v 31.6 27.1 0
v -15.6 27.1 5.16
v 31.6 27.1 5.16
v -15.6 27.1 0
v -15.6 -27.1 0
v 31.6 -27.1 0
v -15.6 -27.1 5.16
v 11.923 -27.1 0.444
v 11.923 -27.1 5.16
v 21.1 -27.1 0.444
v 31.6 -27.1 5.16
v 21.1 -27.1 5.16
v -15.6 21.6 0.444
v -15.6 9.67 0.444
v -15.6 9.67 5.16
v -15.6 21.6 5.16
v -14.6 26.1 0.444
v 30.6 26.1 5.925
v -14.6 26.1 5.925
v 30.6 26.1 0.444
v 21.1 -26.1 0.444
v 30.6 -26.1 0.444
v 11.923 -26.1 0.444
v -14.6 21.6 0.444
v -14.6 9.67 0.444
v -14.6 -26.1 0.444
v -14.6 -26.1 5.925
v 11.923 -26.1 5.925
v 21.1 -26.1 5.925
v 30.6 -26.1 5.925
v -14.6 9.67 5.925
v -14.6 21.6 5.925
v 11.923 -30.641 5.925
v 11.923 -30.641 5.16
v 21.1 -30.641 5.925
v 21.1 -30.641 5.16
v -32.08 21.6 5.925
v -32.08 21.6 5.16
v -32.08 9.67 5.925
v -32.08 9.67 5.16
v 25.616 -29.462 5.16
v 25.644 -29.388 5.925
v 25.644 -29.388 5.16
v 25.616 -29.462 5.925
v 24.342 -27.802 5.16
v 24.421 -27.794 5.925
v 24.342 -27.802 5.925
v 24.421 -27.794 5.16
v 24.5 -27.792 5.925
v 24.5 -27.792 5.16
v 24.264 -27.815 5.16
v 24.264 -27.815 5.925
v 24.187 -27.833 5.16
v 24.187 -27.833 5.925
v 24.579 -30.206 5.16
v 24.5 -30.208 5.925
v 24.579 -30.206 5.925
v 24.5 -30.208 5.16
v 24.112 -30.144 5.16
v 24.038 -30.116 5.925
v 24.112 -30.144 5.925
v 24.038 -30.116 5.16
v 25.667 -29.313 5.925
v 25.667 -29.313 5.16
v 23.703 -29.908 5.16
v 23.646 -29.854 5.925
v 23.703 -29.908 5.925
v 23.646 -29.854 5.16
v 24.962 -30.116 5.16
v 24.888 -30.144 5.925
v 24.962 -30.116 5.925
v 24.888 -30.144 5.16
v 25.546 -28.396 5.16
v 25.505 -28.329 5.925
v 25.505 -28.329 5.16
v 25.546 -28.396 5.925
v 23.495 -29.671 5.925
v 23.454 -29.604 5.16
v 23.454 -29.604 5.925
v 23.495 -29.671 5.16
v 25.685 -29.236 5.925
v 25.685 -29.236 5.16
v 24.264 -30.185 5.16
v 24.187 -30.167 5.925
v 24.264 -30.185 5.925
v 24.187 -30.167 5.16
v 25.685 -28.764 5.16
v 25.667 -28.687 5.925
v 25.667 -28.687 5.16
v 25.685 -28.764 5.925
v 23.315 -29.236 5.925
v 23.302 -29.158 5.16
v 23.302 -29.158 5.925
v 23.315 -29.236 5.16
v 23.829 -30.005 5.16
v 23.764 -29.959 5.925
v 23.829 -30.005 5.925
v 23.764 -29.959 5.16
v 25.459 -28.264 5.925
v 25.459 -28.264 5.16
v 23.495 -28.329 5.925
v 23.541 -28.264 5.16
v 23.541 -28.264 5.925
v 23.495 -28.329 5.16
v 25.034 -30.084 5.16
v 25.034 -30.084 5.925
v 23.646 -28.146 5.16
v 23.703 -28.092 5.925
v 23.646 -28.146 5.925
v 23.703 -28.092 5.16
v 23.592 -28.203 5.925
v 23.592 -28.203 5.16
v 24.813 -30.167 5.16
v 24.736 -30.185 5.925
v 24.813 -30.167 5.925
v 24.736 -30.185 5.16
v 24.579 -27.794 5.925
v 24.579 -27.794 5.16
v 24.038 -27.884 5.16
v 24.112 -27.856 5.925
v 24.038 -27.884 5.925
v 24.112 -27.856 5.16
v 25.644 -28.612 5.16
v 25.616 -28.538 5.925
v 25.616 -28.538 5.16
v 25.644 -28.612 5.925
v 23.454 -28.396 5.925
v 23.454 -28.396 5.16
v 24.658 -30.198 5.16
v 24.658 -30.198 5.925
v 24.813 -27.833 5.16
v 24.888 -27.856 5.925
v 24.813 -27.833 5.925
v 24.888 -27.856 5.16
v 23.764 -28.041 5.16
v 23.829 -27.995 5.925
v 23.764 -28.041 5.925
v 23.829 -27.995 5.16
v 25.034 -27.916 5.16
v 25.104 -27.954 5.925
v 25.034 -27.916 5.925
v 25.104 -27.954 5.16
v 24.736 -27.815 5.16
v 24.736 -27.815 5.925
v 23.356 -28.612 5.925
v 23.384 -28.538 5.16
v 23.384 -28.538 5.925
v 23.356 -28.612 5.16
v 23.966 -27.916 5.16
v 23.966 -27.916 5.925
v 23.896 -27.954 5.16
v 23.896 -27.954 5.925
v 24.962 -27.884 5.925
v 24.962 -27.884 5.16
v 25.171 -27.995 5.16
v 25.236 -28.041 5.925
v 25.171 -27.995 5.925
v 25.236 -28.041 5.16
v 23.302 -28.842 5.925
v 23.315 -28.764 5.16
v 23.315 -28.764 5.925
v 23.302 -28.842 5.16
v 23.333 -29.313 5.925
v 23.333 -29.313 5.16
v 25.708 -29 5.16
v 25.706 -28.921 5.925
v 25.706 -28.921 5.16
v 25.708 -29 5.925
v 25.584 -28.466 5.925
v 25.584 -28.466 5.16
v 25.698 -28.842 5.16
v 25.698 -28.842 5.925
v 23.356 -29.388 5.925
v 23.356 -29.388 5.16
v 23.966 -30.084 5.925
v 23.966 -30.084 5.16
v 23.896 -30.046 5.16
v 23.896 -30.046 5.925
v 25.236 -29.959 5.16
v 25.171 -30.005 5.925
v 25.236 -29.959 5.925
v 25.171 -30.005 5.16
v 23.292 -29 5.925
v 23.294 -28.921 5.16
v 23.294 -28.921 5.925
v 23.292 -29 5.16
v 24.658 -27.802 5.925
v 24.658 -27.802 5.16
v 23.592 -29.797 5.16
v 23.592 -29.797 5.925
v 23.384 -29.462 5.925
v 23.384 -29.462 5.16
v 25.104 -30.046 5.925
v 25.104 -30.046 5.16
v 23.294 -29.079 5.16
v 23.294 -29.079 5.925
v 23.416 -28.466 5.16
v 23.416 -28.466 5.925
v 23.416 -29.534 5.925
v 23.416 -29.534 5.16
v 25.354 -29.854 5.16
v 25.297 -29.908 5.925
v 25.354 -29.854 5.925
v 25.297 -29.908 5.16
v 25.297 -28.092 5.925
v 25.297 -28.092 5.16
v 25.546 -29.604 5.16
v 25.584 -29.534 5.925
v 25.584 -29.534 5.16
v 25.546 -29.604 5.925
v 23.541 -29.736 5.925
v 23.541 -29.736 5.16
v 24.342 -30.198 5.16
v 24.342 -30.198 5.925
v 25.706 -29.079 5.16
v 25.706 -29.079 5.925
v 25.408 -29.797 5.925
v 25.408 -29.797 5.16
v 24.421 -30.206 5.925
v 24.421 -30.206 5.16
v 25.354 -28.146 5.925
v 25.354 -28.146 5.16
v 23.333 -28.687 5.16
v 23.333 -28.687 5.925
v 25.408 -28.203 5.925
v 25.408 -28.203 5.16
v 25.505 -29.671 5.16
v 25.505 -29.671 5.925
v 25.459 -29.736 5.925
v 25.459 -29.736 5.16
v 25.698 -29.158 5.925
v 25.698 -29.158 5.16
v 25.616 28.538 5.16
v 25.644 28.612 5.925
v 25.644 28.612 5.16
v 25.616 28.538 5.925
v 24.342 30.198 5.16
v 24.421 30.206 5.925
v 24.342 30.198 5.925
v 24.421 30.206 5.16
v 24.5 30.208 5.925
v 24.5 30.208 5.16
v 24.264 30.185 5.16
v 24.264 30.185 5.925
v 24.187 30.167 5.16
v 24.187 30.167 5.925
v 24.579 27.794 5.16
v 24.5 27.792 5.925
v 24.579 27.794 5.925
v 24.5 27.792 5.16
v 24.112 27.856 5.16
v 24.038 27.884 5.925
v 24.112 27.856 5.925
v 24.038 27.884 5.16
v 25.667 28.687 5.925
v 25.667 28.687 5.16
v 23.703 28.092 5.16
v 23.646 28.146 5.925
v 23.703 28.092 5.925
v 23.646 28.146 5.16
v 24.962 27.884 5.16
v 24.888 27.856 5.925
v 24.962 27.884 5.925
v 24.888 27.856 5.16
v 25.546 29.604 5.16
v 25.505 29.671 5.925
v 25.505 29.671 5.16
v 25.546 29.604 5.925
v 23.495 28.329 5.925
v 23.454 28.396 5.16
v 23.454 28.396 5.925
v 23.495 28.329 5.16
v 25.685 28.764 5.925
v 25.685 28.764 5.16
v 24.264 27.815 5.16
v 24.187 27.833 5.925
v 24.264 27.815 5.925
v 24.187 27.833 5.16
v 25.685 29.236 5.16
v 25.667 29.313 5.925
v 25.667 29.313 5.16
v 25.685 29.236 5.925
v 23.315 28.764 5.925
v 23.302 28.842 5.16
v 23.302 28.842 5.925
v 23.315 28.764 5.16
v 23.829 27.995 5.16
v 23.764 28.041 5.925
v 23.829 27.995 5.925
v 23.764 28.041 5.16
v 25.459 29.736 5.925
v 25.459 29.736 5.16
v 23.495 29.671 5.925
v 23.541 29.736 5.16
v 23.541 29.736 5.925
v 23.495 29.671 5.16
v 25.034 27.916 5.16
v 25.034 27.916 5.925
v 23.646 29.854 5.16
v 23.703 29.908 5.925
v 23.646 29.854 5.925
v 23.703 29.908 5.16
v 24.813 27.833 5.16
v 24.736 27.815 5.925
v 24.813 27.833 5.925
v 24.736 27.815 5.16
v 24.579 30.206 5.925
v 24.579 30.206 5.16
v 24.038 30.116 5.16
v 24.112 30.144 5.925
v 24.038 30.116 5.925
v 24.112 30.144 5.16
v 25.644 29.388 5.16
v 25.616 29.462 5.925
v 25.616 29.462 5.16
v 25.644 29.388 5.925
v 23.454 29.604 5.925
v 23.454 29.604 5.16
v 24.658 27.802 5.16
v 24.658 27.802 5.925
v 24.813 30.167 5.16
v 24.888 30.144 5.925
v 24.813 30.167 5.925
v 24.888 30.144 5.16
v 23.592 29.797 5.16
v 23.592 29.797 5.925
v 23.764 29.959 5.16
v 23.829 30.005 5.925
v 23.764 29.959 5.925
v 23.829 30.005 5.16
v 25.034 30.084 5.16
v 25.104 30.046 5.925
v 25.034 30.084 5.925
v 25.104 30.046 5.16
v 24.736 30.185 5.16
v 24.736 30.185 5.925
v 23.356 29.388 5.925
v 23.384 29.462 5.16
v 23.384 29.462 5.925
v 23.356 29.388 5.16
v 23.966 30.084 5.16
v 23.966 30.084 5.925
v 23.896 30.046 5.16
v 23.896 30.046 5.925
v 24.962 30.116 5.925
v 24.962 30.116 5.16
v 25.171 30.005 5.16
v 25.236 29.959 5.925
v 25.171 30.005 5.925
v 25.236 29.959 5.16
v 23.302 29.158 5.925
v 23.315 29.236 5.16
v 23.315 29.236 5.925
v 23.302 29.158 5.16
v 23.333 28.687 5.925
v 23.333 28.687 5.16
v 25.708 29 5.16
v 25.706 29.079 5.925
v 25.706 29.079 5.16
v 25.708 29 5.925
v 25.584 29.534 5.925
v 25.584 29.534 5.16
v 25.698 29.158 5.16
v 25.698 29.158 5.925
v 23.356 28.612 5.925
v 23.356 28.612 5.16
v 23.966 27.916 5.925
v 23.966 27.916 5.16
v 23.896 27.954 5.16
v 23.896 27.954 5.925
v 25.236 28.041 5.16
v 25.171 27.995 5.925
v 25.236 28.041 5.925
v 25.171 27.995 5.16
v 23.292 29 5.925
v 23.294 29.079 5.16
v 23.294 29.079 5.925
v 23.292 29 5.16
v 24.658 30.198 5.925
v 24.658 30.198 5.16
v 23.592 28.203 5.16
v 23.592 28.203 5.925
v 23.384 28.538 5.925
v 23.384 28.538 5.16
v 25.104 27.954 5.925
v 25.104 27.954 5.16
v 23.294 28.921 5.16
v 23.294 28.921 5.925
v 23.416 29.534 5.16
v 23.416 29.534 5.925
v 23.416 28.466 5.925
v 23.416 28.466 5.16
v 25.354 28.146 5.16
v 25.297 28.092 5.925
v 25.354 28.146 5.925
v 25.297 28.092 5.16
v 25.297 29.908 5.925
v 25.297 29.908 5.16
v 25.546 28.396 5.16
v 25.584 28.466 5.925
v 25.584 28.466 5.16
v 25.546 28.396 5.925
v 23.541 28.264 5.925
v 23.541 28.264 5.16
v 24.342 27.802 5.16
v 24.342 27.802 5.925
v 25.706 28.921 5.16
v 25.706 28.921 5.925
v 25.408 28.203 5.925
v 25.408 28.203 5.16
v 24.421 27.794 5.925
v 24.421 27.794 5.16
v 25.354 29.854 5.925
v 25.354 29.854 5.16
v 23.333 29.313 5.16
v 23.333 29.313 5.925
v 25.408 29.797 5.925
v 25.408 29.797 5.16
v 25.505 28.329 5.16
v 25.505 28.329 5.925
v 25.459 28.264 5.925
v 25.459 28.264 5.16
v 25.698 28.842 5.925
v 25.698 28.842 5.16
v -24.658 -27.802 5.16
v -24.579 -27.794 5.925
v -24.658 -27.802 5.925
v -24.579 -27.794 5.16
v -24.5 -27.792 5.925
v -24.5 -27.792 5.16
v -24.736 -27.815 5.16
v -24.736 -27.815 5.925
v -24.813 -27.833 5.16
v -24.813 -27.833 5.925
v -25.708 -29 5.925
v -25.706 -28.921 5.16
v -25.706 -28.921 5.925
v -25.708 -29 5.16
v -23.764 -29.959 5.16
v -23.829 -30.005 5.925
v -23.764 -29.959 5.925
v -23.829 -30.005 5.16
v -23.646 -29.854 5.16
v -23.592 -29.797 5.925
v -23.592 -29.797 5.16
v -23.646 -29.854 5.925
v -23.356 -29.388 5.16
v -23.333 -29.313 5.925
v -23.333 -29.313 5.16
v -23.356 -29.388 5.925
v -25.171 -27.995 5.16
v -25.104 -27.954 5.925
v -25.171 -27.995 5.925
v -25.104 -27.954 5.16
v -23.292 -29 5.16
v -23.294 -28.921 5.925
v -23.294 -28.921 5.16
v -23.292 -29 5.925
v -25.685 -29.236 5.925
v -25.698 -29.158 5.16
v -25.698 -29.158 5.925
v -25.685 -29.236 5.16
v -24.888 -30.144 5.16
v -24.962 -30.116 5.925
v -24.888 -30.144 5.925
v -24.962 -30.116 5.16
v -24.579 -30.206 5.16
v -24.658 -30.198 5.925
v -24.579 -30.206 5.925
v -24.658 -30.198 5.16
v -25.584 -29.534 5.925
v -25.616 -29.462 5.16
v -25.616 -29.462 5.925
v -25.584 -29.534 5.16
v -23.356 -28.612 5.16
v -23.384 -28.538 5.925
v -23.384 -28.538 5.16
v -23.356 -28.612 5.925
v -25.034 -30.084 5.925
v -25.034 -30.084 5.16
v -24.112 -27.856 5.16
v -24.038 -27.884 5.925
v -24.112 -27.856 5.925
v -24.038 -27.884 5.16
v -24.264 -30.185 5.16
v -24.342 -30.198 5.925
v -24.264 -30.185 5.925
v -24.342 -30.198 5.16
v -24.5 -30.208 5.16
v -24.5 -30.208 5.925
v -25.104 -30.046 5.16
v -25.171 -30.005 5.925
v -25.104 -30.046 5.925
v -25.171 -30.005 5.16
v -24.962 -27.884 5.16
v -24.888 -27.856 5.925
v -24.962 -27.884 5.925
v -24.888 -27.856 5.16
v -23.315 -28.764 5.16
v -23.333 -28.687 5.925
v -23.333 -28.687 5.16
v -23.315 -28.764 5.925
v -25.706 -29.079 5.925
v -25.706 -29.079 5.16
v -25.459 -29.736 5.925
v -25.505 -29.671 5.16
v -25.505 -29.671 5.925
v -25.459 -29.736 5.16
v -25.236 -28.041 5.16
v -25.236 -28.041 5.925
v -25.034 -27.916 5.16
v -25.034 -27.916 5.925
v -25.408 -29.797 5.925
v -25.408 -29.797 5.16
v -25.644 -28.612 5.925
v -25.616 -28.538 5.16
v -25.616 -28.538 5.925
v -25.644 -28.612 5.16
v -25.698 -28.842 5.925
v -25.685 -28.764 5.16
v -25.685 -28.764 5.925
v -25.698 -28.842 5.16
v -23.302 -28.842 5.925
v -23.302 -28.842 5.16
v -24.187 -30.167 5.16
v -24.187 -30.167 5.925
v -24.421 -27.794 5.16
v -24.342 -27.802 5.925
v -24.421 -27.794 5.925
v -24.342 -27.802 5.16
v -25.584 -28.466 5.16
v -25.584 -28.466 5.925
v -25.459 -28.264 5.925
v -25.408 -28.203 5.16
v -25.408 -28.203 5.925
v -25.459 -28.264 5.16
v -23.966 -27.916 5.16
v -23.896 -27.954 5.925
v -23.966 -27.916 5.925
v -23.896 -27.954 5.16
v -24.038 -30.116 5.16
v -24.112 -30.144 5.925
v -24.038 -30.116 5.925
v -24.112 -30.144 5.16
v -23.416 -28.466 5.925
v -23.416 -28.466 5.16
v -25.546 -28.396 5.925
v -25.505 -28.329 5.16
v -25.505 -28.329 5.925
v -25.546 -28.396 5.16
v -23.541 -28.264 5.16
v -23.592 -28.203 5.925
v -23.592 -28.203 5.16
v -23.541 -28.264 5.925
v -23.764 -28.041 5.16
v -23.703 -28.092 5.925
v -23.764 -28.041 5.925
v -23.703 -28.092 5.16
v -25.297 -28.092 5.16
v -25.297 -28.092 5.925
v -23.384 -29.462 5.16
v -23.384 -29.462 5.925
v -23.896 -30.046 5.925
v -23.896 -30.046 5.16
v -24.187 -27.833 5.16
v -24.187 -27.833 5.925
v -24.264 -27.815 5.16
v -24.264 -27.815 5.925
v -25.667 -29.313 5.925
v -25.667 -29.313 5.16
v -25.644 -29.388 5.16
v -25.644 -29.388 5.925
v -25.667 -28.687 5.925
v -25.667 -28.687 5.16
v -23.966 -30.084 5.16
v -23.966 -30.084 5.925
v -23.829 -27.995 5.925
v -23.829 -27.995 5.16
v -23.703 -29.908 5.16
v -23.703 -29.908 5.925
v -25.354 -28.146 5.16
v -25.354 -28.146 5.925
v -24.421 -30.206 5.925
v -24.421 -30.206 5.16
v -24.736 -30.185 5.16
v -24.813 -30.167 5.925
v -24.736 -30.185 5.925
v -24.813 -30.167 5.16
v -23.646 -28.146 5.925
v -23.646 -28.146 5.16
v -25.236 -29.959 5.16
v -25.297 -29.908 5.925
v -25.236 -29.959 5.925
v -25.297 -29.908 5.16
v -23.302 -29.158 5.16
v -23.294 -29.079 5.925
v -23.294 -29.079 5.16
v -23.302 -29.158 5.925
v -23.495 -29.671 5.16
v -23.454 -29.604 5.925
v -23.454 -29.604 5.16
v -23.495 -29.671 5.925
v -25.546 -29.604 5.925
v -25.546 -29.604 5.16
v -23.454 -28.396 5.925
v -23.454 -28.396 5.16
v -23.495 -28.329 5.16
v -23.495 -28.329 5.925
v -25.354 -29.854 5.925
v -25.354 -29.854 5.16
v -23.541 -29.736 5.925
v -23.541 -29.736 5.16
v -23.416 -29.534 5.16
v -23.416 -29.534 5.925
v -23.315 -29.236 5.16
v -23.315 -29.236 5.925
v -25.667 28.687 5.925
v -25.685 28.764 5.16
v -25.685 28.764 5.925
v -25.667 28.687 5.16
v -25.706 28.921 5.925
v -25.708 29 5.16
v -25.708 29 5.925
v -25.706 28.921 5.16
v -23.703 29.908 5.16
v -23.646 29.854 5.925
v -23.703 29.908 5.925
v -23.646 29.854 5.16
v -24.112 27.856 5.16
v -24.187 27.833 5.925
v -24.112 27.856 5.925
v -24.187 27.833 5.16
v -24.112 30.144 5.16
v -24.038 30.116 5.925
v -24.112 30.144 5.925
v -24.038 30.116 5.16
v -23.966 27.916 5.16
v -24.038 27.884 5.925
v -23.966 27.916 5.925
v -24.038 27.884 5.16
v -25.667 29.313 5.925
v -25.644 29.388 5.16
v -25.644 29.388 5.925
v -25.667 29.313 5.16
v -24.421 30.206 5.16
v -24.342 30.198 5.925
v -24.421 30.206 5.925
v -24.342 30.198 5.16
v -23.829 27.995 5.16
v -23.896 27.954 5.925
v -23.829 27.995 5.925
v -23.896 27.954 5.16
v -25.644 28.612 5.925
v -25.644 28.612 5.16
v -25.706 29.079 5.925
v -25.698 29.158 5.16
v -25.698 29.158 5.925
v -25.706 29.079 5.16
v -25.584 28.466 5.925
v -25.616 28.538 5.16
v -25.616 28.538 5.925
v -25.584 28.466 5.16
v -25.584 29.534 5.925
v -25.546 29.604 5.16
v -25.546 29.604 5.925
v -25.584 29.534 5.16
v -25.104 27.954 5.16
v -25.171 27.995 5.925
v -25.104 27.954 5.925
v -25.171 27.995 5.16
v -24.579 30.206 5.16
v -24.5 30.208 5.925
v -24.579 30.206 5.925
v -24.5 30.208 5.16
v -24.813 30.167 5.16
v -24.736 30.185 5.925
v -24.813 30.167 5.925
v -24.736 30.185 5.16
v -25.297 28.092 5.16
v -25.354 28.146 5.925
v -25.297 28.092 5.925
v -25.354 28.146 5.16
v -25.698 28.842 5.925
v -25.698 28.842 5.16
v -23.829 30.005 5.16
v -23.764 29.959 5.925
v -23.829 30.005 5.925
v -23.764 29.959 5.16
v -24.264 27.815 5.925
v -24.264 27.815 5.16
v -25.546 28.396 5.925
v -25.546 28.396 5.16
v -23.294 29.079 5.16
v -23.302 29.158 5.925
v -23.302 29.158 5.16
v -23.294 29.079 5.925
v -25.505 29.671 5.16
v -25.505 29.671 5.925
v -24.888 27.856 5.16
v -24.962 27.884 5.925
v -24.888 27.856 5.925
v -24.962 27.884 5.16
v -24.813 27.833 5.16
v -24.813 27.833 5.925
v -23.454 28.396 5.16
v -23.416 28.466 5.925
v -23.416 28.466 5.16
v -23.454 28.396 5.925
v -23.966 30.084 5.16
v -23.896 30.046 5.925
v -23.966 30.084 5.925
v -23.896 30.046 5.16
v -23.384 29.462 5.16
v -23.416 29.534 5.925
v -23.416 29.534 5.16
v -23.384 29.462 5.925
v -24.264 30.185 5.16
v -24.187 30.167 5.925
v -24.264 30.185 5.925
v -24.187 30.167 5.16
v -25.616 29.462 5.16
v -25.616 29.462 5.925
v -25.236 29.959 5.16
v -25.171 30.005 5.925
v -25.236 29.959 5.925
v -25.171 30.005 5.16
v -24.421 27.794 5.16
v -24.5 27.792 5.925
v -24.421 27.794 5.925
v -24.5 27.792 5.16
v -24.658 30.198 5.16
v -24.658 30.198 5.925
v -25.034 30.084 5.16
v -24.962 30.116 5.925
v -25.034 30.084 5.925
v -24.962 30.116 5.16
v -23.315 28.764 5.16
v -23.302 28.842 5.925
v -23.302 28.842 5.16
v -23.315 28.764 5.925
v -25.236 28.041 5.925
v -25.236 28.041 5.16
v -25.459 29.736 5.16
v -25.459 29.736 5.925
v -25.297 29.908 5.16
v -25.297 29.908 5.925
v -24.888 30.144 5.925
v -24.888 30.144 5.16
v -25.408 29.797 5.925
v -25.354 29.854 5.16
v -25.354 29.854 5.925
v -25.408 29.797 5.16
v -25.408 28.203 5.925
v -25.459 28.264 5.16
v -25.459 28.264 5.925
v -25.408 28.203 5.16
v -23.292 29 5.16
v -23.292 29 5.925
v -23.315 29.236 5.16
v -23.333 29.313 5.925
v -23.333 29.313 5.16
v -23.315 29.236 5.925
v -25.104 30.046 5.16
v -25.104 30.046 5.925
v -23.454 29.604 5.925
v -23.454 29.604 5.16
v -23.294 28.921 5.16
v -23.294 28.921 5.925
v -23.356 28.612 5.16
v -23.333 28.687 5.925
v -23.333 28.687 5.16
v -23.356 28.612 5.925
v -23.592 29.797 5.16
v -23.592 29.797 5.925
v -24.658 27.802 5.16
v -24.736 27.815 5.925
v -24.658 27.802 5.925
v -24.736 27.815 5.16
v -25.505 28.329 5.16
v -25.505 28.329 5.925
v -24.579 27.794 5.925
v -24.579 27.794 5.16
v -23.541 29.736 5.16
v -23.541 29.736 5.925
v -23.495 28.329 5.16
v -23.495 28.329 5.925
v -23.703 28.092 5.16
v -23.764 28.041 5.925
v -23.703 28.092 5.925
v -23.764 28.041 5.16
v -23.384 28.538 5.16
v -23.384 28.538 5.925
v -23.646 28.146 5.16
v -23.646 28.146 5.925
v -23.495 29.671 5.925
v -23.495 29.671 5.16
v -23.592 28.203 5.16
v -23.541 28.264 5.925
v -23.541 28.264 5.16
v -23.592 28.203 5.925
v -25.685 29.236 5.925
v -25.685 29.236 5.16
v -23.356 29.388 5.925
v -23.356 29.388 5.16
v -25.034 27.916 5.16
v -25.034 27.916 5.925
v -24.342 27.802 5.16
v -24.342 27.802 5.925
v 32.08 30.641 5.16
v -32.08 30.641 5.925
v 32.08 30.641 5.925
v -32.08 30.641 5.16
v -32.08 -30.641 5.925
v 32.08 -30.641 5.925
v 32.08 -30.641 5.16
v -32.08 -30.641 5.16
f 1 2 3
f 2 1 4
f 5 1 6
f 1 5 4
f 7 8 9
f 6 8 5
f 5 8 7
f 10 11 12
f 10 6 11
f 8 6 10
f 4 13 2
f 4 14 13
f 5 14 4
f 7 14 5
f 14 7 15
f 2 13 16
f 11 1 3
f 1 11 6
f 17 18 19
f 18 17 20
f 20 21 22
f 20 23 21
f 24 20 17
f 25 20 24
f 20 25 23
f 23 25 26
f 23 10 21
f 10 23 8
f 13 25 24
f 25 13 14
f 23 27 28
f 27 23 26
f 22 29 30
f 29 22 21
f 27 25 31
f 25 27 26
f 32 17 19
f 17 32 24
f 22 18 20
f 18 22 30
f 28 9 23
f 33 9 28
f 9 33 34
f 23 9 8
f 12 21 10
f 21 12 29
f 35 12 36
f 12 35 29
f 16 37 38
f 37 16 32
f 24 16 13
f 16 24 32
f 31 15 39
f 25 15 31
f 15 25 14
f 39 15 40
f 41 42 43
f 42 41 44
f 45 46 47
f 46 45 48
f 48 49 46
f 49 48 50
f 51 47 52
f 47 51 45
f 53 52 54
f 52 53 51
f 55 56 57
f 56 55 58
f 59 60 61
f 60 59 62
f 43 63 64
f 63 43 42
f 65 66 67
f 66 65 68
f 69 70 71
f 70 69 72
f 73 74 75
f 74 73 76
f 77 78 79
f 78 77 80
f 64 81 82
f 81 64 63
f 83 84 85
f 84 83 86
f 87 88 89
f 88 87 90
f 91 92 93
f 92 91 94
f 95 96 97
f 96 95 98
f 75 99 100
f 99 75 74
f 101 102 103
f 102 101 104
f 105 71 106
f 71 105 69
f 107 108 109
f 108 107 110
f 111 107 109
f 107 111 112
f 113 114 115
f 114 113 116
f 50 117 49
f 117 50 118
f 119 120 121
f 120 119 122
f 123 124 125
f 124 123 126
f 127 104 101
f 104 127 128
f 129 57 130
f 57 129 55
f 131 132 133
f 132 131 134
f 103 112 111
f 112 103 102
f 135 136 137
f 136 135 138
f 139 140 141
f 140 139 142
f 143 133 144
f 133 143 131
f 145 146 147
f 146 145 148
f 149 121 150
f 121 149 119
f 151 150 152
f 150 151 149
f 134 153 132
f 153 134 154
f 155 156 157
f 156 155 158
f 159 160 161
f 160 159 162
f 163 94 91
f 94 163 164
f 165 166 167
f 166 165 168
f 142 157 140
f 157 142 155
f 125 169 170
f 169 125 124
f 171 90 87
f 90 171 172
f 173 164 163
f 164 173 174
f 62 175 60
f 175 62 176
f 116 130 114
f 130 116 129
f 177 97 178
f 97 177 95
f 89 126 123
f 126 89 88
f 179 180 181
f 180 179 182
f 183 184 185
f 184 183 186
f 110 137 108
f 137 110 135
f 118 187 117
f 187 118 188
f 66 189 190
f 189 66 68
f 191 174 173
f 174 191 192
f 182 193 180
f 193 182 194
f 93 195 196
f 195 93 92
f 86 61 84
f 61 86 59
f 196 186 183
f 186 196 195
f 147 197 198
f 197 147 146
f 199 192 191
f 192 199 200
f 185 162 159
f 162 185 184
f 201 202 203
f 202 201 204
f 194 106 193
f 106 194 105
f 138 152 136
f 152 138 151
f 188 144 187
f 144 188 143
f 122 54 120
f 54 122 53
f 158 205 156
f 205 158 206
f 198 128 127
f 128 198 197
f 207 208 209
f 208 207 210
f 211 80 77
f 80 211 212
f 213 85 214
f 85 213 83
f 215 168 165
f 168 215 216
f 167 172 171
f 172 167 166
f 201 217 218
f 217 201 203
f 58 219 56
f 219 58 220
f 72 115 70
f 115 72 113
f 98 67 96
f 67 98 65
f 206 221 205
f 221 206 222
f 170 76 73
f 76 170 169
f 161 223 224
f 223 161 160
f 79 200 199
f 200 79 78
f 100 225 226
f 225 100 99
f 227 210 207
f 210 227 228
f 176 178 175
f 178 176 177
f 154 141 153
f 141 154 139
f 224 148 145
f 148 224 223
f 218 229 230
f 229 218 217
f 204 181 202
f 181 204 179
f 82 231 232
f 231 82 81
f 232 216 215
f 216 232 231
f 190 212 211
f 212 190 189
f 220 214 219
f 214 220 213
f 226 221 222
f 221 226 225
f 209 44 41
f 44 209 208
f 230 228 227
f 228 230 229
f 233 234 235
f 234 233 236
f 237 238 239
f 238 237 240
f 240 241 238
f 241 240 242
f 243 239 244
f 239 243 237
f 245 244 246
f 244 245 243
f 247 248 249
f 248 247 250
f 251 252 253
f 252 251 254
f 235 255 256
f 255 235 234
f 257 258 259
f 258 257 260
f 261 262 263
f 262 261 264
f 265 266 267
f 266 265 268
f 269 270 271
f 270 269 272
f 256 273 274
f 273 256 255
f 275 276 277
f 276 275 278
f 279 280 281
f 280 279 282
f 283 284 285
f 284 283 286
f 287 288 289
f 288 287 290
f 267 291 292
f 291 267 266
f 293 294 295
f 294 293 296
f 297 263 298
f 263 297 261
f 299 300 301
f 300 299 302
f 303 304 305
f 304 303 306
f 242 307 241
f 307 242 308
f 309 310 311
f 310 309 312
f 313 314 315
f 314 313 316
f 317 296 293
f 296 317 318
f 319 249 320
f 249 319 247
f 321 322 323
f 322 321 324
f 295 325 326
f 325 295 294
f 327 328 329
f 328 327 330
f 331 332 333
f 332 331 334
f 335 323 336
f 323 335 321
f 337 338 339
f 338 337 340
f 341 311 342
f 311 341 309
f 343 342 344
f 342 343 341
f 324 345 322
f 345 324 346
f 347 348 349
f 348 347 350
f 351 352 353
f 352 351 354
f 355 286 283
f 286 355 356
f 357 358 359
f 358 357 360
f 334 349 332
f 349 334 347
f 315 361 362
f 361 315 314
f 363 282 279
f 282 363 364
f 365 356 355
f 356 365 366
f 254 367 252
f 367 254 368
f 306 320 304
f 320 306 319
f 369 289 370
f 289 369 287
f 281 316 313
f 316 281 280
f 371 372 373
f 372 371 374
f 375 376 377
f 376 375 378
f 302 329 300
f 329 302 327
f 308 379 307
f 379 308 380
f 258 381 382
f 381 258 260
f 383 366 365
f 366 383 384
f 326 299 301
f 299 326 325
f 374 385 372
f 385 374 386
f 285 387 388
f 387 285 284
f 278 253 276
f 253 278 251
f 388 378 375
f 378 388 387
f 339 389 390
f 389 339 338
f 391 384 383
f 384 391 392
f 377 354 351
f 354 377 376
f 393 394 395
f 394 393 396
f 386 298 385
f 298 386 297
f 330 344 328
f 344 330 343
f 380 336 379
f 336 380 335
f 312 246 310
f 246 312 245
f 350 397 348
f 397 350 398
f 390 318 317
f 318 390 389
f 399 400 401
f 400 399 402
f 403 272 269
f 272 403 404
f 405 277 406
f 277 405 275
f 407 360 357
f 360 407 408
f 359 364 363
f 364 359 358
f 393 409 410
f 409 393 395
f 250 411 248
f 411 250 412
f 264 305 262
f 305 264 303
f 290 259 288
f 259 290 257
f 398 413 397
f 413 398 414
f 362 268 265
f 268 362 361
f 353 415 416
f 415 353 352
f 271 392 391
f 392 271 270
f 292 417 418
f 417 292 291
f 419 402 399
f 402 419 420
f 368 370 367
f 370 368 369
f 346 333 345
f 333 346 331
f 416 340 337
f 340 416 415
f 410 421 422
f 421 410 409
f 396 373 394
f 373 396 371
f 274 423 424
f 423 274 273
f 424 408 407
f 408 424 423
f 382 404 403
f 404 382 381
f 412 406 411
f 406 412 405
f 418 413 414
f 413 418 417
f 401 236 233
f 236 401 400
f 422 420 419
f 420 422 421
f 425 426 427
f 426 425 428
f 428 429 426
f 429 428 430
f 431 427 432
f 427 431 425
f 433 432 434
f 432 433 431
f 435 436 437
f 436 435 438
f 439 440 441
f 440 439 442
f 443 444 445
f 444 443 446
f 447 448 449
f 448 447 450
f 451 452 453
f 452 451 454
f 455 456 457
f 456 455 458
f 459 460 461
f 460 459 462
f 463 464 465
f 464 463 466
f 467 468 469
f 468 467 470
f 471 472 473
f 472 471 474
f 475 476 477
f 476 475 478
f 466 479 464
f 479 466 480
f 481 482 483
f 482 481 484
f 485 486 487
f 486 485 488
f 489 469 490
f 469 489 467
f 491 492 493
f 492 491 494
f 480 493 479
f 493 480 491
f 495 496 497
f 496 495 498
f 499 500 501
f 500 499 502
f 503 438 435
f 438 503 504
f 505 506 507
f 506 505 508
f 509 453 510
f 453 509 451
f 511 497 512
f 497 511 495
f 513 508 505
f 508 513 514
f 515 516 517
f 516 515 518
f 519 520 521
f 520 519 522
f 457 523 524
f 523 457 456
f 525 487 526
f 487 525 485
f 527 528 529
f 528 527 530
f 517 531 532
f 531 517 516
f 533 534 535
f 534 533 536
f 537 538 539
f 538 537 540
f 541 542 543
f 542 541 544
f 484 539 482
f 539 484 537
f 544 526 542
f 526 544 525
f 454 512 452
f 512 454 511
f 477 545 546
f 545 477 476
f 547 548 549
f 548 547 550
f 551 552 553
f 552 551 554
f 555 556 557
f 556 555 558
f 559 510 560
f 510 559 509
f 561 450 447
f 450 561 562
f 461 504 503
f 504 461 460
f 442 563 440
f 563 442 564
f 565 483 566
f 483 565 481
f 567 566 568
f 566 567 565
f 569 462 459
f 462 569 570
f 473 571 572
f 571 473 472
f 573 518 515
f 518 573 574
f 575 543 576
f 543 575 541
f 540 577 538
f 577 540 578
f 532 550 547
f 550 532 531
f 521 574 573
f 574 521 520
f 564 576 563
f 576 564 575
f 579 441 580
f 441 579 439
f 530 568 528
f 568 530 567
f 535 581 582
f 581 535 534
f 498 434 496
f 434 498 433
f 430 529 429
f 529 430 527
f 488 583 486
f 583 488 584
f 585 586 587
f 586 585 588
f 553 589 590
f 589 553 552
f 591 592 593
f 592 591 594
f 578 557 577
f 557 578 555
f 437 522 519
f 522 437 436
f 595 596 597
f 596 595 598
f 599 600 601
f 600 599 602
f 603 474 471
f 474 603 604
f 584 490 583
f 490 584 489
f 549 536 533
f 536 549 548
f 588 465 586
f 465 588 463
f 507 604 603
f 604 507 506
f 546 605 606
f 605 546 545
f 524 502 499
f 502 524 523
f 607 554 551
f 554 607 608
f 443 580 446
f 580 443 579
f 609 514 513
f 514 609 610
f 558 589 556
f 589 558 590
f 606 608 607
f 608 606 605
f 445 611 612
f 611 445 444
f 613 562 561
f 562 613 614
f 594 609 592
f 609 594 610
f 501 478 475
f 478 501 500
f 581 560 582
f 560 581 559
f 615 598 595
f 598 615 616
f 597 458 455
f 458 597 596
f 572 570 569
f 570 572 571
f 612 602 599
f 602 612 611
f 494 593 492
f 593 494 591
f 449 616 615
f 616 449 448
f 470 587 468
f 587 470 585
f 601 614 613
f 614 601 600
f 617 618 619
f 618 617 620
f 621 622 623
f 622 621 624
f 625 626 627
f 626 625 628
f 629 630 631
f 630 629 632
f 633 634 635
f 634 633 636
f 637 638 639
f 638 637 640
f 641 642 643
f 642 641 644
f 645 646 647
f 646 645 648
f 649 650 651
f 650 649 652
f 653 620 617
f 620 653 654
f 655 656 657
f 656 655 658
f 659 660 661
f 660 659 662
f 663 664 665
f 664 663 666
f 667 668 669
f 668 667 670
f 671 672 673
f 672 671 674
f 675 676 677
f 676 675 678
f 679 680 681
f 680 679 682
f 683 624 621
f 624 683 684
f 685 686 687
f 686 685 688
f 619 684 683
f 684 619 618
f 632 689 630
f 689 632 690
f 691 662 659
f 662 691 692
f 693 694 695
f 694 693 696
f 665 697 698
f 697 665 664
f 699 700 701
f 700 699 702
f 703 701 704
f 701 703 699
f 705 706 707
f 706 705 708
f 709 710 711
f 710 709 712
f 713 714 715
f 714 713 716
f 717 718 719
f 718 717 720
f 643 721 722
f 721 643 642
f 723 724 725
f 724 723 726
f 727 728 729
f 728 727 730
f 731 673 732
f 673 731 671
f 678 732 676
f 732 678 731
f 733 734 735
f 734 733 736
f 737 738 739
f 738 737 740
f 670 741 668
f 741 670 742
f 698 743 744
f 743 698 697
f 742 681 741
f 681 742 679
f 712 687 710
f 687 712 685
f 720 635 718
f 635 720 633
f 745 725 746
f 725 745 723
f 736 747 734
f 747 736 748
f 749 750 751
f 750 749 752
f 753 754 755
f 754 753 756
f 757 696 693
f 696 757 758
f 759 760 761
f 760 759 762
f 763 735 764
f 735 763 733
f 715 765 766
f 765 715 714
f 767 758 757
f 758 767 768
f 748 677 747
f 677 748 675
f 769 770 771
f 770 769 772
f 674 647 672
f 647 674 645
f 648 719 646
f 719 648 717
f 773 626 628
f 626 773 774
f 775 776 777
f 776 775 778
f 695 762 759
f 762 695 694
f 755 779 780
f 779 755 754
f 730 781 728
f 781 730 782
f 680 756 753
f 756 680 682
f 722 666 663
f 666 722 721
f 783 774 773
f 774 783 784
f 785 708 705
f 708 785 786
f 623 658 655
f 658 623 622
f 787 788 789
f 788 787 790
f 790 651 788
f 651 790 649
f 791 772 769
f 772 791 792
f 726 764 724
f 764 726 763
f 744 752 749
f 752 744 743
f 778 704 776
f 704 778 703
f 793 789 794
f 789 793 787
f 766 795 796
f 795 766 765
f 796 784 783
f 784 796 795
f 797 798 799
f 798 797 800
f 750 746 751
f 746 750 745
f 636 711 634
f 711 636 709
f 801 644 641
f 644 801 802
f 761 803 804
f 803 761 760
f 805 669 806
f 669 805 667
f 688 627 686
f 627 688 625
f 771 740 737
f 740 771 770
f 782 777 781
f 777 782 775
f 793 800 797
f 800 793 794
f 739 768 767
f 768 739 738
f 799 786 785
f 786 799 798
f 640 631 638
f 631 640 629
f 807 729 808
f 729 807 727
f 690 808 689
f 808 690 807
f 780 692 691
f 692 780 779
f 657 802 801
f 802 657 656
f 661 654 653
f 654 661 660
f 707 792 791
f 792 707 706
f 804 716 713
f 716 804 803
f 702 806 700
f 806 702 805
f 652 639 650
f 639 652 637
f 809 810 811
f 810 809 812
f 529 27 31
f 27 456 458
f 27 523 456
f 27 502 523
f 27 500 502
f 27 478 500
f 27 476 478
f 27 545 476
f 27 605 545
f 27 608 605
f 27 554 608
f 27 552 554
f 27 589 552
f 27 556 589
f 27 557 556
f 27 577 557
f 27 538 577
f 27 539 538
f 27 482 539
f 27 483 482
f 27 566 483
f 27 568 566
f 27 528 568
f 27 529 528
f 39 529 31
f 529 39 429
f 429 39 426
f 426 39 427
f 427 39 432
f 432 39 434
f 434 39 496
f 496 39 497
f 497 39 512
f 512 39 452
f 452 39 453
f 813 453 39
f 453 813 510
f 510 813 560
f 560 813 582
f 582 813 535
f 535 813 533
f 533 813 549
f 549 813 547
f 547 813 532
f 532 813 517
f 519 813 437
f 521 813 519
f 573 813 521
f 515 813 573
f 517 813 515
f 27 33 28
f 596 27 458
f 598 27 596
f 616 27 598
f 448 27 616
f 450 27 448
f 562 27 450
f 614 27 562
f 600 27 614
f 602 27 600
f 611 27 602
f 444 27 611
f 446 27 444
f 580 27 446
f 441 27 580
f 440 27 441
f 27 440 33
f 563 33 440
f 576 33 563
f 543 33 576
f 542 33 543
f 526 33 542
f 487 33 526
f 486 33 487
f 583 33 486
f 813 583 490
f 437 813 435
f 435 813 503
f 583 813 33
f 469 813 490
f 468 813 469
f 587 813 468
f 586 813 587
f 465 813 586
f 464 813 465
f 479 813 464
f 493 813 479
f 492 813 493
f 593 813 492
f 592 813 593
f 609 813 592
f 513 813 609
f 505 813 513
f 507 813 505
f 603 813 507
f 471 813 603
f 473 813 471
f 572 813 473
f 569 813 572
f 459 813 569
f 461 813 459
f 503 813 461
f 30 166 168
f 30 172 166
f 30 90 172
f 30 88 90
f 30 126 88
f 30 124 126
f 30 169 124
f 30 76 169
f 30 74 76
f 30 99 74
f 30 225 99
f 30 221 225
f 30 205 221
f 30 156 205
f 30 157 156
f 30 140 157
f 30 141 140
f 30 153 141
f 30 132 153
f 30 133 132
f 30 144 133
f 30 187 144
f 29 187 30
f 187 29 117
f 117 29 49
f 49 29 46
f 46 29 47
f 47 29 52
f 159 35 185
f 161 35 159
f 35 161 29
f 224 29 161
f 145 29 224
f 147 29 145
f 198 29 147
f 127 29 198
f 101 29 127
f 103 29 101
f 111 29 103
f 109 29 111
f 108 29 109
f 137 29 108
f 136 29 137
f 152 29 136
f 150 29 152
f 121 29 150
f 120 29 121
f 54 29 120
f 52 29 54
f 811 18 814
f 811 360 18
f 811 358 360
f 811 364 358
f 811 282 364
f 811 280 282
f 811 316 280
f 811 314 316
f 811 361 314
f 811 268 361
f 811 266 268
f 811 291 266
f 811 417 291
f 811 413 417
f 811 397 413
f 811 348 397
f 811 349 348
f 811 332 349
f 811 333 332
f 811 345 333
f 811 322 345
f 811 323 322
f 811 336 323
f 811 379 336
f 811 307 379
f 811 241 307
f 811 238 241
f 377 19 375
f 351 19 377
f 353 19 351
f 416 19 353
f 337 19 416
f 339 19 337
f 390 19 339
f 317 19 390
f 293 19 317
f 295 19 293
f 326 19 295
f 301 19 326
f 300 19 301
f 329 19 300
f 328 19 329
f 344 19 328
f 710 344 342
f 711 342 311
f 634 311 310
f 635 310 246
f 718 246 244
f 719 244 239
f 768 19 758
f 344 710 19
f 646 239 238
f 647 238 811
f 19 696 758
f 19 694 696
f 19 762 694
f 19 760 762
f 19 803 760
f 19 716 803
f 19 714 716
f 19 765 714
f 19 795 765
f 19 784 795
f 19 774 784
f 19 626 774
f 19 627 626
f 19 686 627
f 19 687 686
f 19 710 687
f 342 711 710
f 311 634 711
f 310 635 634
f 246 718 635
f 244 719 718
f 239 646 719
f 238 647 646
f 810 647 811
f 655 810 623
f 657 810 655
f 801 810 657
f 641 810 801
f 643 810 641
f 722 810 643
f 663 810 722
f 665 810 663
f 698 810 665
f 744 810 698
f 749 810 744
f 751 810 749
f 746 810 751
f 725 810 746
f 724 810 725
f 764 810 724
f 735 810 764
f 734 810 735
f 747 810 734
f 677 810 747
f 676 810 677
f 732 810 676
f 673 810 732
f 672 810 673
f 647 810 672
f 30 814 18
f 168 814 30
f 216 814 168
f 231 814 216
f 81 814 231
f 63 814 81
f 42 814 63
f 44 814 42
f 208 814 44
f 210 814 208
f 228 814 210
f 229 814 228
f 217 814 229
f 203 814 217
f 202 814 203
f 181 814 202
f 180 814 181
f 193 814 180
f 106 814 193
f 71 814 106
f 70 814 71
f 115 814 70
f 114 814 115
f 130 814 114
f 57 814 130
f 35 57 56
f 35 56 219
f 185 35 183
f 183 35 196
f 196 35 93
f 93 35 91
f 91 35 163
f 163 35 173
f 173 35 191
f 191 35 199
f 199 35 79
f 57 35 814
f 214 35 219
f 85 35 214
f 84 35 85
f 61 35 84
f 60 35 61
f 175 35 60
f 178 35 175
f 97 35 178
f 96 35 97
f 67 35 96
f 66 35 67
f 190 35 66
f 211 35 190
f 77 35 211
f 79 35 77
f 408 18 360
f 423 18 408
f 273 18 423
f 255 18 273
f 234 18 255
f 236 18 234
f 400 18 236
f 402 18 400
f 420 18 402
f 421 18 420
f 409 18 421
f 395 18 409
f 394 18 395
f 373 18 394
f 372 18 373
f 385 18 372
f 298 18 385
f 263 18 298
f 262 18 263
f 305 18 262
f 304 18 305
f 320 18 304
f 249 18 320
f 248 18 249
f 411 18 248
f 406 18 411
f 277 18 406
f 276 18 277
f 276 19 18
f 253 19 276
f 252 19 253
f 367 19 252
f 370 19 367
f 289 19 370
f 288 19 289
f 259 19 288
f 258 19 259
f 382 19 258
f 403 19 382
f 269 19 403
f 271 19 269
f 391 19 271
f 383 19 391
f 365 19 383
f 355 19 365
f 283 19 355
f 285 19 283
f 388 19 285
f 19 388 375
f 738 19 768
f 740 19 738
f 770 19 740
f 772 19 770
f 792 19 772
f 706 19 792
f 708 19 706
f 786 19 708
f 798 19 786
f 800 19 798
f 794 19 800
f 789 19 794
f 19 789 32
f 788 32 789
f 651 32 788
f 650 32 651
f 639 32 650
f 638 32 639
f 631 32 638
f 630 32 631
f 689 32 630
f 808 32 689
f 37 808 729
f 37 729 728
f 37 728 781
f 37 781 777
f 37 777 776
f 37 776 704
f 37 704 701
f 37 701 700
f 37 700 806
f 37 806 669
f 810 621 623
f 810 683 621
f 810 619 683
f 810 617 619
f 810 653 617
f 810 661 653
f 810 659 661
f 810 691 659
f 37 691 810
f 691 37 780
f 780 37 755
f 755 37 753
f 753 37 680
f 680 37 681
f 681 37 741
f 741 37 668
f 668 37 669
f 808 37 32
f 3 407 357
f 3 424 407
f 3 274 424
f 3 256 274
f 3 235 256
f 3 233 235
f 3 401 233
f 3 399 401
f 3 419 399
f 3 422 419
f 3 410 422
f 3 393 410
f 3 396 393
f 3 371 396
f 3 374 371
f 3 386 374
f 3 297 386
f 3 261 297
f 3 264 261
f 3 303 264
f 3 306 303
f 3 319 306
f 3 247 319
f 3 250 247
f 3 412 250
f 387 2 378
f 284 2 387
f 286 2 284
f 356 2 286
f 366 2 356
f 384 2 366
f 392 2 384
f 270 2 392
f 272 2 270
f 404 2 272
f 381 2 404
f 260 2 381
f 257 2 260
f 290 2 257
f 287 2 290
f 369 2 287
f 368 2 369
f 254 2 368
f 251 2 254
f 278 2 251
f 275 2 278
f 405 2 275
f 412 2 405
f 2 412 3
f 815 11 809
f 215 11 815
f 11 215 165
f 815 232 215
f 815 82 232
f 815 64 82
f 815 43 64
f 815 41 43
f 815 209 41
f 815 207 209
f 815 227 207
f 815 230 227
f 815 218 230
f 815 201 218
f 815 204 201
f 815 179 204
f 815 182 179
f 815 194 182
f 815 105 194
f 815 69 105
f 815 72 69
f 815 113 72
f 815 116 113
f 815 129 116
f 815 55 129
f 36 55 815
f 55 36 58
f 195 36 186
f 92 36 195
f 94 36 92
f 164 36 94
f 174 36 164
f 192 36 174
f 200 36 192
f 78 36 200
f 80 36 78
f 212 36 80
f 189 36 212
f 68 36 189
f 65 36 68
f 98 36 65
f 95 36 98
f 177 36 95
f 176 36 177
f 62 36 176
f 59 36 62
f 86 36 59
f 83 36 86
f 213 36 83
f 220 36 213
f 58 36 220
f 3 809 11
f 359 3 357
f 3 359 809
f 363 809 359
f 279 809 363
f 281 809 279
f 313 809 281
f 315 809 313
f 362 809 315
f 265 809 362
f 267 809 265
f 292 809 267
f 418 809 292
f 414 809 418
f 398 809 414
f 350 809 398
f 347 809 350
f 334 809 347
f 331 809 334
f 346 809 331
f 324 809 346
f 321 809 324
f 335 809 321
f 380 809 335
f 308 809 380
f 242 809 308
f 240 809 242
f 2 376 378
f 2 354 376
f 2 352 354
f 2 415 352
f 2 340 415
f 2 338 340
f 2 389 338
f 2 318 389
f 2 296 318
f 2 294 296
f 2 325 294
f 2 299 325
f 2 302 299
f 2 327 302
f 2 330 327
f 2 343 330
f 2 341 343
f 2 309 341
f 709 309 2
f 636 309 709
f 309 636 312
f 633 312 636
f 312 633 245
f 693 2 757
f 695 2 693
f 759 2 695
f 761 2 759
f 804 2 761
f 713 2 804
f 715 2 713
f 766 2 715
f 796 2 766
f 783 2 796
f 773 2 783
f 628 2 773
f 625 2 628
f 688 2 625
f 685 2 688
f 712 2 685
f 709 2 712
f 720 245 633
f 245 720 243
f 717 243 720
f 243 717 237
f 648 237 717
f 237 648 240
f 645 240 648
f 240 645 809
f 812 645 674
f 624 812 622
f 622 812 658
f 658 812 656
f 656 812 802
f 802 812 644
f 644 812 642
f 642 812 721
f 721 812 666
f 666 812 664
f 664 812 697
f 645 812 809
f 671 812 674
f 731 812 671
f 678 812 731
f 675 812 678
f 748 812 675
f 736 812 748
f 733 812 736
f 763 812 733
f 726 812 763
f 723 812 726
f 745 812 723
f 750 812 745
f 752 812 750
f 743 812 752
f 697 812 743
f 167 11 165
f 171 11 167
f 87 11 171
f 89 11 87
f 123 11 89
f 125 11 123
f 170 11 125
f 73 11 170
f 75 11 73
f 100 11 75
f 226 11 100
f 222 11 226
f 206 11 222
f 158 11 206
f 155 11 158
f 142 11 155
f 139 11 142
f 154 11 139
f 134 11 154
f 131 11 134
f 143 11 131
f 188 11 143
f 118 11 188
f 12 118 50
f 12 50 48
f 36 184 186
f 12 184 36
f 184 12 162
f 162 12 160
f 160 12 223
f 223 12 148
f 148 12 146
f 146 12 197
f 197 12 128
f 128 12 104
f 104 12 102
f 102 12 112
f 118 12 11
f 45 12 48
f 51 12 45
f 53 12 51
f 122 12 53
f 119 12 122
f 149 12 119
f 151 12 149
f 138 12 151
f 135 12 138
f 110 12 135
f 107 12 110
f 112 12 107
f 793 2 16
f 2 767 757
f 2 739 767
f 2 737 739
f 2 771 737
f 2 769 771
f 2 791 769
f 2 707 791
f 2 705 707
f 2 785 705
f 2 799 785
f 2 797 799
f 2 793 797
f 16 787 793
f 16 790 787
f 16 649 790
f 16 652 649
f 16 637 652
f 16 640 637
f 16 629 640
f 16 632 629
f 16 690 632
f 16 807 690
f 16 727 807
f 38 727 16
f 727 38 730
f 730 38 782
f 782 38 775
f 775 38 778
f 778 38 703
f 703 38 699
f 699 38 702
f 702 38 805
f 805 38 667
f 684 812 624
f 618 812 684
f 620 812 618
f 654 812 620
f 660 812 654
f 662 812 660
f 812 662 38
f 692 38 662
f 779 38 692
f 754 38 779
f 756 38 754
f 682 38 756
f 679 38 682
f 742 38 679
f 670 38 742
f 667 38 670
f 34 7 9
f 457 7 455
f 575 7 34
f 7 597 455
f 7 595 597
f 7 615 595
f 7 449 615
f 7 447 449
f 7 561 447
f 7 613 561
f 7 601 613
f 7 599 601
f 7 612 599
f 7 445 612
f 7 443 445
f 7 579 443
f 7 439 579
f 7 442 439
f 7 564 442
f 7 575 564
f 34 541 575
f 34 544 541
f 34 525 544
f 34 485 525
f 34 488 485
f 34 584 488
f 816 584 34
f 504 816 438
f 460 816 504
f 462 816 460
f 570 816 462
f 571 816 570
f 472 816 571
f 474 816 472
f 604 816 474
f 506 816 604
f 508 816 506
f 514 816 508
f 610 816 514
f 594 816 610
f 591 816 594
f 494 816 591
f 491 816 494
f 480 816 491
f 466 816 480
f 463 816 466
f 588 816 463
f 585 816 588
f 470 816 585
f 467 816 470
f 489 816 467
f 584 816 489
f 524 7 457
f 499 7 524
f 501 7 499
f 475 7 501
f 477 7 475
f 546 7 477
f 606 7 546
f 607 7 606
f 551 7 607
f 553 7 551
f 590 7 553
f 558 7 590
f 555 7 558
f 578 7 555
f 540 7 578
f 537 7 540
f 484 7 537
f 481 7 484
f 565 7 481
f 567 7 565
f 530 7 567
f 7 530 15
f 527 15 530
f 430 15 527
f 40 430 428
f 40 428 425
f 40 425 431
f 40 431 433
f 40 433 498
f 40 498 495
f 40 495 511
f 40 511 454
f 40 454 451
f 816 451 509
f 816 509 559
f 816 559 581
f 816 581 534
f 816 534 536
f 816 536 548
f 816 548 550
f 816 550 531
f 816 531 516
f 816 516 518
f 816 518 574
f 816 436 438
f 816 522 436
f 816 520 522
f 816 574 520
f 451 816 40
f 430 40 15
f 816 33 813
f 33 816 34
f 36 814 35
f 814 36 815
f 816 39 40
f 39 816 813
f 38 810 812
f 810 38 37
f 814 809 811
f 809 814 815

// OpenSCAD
// ============================================================
// Battery_Holder.scad
//
// Existing geometry preserved.
// Only the two cut placements are changed to match the second
// layout after the existing final 90-degree rotation.
//
// Units: mm
// ============================================================

$fn = 96;

// ============================================================
// OVERALL HOLDER DIMENSIONS
// ============================================================

overall_w = 61.2827;
overall_d = 64.1609;
overall_h = 5.9252;

floor_t = 0.44385;
wall_h = 5.18313;
flange_t = 0.765216;
tray_wall_t = 1.0;

flange_z = overall_h - flange_t;

// ============================================================
// ORIGINAL INNER OPENING REGION
// ============================================================

original_pocket_w = 49.0;
original_pocket_d = 58.0;

original_pocket_x0 = -original_pocket_w / 2;
original_pocket_x1 =  original_pocket_w / 2;

original_pocket_y0 = -original_pocket_d / 2;
original_pocket_y1 =  original_pocket_d / 2;

// ============================================================
// PUSHED-OUT POCKET / MOVED SHORT-OPENING-SIDE WALL
// ============================================================

pocket_wall_push_out = 1.60;
short_opening_side_wall_move = 16.0;

expanded_pocket_x0 = original_pocket_x0 - pocket_wall_push_out;
expanded_pocket_x1 = original_pocket_x1 + pocket_wall_push_out;

expanded_pocket_y0 = original_pocket_y0 - pocket_wall_push_out;
expanded_pocket_y1 = original_pocket_y1 + pocket_wall_push_out;

// Actual tray pocket boundaries
pocket_x0 = expanded_pocket_x0;
pocket_x1 = expanded_pocket_x1;

pocket_y0 = expanded_pocket_y0;
pocket_y1 = expanded_pocket_y1 - short_opening_side_wall_move;

pocket_w = pocket_x1 - pocket_x0;
pocket_d = pocket_y1 - pocket_y0;

// ============================================================
// SCREW HOLES / UNDER-HOLE HARDWARE
// ============================================================

hole_pitch_x = 58.0;
hole_pitch_y = 49.0;

hole_d = 2.41639;

underside_hardware_d = 5.4;
hardware_reference_h = 6.0;

hardware_r = underside_hardware_d / 2;
opening_to_hardware_gap = 0.20;

hole_x = hole_pitch_x / 2;
hole_y = hole_pitch_y / 2;

hole_positions = [
    [-hole_x, -hole_y],
    [ hole_x, -hole_y],
    [-hole_x,  hole_y],
    [ hole_x,  hole_y]
];

// ============================================================
// CUT PLACEMENT EDITOR CONTROLS
// ============================================================

// Moves the final-view SMALL BOTTOM opening left/right.
small_opening_shift_along_edge = 0.0;

// Moves the final-view LARGE LEFT opening up/down.
large_opening_shift_along_edge = 0.0;

// How far each cut passes through its wall.
small_opening_into_pocket = 1.25;
large_opening_into_pocket = 1.25;

// ============================================================
// FINAL DISPLAYED ORIENTATION
// ============================================================

model_rotation_z = 90;

// Final displayed width/depth after rotating the current model.
final_overall_w = overall_d;
final_overall_d = overall_w;

// ============================================================
// SMALL BOTTOM OPENING — TARGET FINAL-VIEW POSITION
// ============================================================
//
// This opening is defined where it needs to appear AFTER the
// existing 90-degree final rotation, then converted backward
// into the unrotated coordinates used by the model.
// ============================================================

small_final_opening_w = 9.17705;

// Final visible placement: bottom edge, toward right screw hole.
small_final_opening_right =
    hole_x - hardware_r - opening_to_hardware_gap
    + small_opening_shift_along_edge-5;

small_final_opening_left =
    small_final_opening_right - small_final_opening_w;

small_final_opening_bottom =
    -final_overall_d / 2 - 0.10;

small_final_opening_top =
    -hole_y + hardware_r + opening_to_hardware_gap
    + tray_wall_t
    + small_opening_into_pocket;

// Convert final rectangle back through rotate([0,0,90]):
// final_x = -original_y
// final_y =  original_x

small_opening_x0 = small_final_opening_bottom;
small_opening_y0 = -small_final_opening_right;

small_opening_w =
    small_final_opening_top - small_final_opening_bottom;

small_opening_d =
    small_final_opening_right - small_final_opening_left;

// ============================================================
// LARGE LEFT OPENING — TARGET FINAL-VIEW POSITION
// ============================================================
//
// Final visible placement: left edge, toward upper-left area.
// Converted backward into the existing unrotated model space.
// ============================================================

large_final_opening_d = 11.9299;

large_final_opening_top =
    hole_y - hardware_r - opening_to_hardware_gap
    + large_opening_shift_along_edge;

large_final_opening_bottom =
    large_final_opening_top - large_final_opening_d;

large_final_opening_left =
    -final_overall_w / 2 - 0.10;

large_final_opening_right =
    -hole_x + hardware_r + opening_to_hardware_gap
    + tray_wall_t
    + large_opening_into_pocket+10;

// Convert final rectangle back through rotate([0,0,90]).

large_opening_x0 = large_final_opening_bottom;
large_opening_y0 = -large_final_opening_right;

large_opening_w =
    large_final_opening_top - large_final_opening_bottom;

large_opening_d =
    large_final_opening_right - large_final_opening_left;

// ============================================================
// PREVIEW TOGGLES
// ============================================================

show_hardware_references = true;
show_cut_references = true;

// ============================================================
// CUTTERS
// ============================================================

module mounting_hole(x, y) {
    translate([x, y, flange_z - 0.1])
        cylinder(
            h = flange_t + 0.3,
            d = hole_d
        );
}

module small_access_opening_cut(
    z_start = floor_t,
    cut_h = overall_h + 1
) {
    translate([
        small_opening_x0,
        small_opening_y0,
        z_start
    ])
        cube([
            small_opening_w,
            small_opening_d,
            cut_h
        ]);
}

module large_side_opening_cut(
    z_start = floor_t,
    cut_h = overall_h + 1
) {
    translate([
        large_opening_x0,
        large_opening_y0,
        z_start
    ])
        cube([
            large_opening_w,
            large_opening_d,
            cut_h
        ]);
}

// ============================================================
// FLOOR
// ============================================================

module battery_floor() {
    translate([
        pocket_x0,
        pocket_y0,
        0
    ])
        cube([
            pocket_w,
            pocket_d,
            floor_t
        ]);
}

// ============================================================
// TRAY WALLS
// ============================================================

module tray_walls_uncut() {
    difference() {

        translate([
            pocket_x0 - tray_wall_t,
            pocket_y0 - tray_wall_t,
            0
        ])
            cube([
                pocket_w + tray_wall_t * 2,
                pocket_d + tray_wall_t * 2,
                wall_h
            ]);

        translate([
            pocket_x0,
            pocket_y0,
            floor_t
        ])
            cube([
                pocket_w,
                pocket_d,
                wall_h + 1
            ]);
    }
}

module tray_walls() {
    difference() {
        tray_walls_uncut();

        small_access_opening_cut();
        large_side_opening_cut();
    }
}

// ============================================================
// TOP FLANGE
// ============================================================

module top_flange() {
    difference() {

        translate([
            -overall_w / 2,
            -overall_d / 2,
            flange_z
        ])
            cube([
                overall_w,
                overall_d,
                flange_t
            ]);

        translate([
            pocket_x0,
            pocket_y0,
            flange_z - 0.1
        ])
            cube([
                pocket_w,
                pocket_d,
                flange_t + 0.3
            ]);

        small_access_opening_cut(
            flange_z - 0.1,
            flange_t + 0.3
        );

        large_side_opening_cut(
            flange_z - 0.1,
            flange_t + 0.3
        );

        for (pos = hole_positions) {
            mounting_hole(pos[0], pos[1]);
        }
    }
}

// ============================================================
// UNROTATED HOLDER
// ============================================================

module battery_holder_unrotated() {
    union() {
        battery_floor();
        tray_walls();
        top_flange();
    }
}

// ============================================================
// FINAL ROTATED HOLDER
// ============================================================

module battery_holder() {
    rotate([0, 0, model_rotation_z])
        battery_holder_unrotated();
}

// ============================================================
// PREVIEW-ONLY HARDWARE REFERENCES
// ============================================================

module hardware_references_unrotated() {
    for (pos = hole_positions) {
        %color("Crimson", 0.45)
            translate([
                pos[0],
                pos[1],
                flange_z - hardware_reference_h
            ])
                cylinder(
                    h = hardware_reference_h,
                    d = underside_hardware_d
                );
    }
}

module hardware_references() {
    rotate([0, 0, model_rotation_z])
        hardware_references_unrotated();
}

// ============================================================
// PREVIEW-ONLY CUT REFERENCES
// ============================================================

module cut_references_unrotated() {

    %color("DeepPink", 0.65)
        small_access_opening_cut(
            floor_t,
            overall_h + 1
        );

    %color("Cyan", 0.65)
        large_side_opening_cut(
            floor_t,
            overall_h + 1
        );
}

module cut_references() {
    rotate([0, 0, model_rotation_z])
        cut_references_unrotated();
}

// ============================================================
// OUTPUT
// ============================================================

battery_holder();

if (show_hardware_references)
    hardware_references();

if (show_cut_references)
    cut_references();
